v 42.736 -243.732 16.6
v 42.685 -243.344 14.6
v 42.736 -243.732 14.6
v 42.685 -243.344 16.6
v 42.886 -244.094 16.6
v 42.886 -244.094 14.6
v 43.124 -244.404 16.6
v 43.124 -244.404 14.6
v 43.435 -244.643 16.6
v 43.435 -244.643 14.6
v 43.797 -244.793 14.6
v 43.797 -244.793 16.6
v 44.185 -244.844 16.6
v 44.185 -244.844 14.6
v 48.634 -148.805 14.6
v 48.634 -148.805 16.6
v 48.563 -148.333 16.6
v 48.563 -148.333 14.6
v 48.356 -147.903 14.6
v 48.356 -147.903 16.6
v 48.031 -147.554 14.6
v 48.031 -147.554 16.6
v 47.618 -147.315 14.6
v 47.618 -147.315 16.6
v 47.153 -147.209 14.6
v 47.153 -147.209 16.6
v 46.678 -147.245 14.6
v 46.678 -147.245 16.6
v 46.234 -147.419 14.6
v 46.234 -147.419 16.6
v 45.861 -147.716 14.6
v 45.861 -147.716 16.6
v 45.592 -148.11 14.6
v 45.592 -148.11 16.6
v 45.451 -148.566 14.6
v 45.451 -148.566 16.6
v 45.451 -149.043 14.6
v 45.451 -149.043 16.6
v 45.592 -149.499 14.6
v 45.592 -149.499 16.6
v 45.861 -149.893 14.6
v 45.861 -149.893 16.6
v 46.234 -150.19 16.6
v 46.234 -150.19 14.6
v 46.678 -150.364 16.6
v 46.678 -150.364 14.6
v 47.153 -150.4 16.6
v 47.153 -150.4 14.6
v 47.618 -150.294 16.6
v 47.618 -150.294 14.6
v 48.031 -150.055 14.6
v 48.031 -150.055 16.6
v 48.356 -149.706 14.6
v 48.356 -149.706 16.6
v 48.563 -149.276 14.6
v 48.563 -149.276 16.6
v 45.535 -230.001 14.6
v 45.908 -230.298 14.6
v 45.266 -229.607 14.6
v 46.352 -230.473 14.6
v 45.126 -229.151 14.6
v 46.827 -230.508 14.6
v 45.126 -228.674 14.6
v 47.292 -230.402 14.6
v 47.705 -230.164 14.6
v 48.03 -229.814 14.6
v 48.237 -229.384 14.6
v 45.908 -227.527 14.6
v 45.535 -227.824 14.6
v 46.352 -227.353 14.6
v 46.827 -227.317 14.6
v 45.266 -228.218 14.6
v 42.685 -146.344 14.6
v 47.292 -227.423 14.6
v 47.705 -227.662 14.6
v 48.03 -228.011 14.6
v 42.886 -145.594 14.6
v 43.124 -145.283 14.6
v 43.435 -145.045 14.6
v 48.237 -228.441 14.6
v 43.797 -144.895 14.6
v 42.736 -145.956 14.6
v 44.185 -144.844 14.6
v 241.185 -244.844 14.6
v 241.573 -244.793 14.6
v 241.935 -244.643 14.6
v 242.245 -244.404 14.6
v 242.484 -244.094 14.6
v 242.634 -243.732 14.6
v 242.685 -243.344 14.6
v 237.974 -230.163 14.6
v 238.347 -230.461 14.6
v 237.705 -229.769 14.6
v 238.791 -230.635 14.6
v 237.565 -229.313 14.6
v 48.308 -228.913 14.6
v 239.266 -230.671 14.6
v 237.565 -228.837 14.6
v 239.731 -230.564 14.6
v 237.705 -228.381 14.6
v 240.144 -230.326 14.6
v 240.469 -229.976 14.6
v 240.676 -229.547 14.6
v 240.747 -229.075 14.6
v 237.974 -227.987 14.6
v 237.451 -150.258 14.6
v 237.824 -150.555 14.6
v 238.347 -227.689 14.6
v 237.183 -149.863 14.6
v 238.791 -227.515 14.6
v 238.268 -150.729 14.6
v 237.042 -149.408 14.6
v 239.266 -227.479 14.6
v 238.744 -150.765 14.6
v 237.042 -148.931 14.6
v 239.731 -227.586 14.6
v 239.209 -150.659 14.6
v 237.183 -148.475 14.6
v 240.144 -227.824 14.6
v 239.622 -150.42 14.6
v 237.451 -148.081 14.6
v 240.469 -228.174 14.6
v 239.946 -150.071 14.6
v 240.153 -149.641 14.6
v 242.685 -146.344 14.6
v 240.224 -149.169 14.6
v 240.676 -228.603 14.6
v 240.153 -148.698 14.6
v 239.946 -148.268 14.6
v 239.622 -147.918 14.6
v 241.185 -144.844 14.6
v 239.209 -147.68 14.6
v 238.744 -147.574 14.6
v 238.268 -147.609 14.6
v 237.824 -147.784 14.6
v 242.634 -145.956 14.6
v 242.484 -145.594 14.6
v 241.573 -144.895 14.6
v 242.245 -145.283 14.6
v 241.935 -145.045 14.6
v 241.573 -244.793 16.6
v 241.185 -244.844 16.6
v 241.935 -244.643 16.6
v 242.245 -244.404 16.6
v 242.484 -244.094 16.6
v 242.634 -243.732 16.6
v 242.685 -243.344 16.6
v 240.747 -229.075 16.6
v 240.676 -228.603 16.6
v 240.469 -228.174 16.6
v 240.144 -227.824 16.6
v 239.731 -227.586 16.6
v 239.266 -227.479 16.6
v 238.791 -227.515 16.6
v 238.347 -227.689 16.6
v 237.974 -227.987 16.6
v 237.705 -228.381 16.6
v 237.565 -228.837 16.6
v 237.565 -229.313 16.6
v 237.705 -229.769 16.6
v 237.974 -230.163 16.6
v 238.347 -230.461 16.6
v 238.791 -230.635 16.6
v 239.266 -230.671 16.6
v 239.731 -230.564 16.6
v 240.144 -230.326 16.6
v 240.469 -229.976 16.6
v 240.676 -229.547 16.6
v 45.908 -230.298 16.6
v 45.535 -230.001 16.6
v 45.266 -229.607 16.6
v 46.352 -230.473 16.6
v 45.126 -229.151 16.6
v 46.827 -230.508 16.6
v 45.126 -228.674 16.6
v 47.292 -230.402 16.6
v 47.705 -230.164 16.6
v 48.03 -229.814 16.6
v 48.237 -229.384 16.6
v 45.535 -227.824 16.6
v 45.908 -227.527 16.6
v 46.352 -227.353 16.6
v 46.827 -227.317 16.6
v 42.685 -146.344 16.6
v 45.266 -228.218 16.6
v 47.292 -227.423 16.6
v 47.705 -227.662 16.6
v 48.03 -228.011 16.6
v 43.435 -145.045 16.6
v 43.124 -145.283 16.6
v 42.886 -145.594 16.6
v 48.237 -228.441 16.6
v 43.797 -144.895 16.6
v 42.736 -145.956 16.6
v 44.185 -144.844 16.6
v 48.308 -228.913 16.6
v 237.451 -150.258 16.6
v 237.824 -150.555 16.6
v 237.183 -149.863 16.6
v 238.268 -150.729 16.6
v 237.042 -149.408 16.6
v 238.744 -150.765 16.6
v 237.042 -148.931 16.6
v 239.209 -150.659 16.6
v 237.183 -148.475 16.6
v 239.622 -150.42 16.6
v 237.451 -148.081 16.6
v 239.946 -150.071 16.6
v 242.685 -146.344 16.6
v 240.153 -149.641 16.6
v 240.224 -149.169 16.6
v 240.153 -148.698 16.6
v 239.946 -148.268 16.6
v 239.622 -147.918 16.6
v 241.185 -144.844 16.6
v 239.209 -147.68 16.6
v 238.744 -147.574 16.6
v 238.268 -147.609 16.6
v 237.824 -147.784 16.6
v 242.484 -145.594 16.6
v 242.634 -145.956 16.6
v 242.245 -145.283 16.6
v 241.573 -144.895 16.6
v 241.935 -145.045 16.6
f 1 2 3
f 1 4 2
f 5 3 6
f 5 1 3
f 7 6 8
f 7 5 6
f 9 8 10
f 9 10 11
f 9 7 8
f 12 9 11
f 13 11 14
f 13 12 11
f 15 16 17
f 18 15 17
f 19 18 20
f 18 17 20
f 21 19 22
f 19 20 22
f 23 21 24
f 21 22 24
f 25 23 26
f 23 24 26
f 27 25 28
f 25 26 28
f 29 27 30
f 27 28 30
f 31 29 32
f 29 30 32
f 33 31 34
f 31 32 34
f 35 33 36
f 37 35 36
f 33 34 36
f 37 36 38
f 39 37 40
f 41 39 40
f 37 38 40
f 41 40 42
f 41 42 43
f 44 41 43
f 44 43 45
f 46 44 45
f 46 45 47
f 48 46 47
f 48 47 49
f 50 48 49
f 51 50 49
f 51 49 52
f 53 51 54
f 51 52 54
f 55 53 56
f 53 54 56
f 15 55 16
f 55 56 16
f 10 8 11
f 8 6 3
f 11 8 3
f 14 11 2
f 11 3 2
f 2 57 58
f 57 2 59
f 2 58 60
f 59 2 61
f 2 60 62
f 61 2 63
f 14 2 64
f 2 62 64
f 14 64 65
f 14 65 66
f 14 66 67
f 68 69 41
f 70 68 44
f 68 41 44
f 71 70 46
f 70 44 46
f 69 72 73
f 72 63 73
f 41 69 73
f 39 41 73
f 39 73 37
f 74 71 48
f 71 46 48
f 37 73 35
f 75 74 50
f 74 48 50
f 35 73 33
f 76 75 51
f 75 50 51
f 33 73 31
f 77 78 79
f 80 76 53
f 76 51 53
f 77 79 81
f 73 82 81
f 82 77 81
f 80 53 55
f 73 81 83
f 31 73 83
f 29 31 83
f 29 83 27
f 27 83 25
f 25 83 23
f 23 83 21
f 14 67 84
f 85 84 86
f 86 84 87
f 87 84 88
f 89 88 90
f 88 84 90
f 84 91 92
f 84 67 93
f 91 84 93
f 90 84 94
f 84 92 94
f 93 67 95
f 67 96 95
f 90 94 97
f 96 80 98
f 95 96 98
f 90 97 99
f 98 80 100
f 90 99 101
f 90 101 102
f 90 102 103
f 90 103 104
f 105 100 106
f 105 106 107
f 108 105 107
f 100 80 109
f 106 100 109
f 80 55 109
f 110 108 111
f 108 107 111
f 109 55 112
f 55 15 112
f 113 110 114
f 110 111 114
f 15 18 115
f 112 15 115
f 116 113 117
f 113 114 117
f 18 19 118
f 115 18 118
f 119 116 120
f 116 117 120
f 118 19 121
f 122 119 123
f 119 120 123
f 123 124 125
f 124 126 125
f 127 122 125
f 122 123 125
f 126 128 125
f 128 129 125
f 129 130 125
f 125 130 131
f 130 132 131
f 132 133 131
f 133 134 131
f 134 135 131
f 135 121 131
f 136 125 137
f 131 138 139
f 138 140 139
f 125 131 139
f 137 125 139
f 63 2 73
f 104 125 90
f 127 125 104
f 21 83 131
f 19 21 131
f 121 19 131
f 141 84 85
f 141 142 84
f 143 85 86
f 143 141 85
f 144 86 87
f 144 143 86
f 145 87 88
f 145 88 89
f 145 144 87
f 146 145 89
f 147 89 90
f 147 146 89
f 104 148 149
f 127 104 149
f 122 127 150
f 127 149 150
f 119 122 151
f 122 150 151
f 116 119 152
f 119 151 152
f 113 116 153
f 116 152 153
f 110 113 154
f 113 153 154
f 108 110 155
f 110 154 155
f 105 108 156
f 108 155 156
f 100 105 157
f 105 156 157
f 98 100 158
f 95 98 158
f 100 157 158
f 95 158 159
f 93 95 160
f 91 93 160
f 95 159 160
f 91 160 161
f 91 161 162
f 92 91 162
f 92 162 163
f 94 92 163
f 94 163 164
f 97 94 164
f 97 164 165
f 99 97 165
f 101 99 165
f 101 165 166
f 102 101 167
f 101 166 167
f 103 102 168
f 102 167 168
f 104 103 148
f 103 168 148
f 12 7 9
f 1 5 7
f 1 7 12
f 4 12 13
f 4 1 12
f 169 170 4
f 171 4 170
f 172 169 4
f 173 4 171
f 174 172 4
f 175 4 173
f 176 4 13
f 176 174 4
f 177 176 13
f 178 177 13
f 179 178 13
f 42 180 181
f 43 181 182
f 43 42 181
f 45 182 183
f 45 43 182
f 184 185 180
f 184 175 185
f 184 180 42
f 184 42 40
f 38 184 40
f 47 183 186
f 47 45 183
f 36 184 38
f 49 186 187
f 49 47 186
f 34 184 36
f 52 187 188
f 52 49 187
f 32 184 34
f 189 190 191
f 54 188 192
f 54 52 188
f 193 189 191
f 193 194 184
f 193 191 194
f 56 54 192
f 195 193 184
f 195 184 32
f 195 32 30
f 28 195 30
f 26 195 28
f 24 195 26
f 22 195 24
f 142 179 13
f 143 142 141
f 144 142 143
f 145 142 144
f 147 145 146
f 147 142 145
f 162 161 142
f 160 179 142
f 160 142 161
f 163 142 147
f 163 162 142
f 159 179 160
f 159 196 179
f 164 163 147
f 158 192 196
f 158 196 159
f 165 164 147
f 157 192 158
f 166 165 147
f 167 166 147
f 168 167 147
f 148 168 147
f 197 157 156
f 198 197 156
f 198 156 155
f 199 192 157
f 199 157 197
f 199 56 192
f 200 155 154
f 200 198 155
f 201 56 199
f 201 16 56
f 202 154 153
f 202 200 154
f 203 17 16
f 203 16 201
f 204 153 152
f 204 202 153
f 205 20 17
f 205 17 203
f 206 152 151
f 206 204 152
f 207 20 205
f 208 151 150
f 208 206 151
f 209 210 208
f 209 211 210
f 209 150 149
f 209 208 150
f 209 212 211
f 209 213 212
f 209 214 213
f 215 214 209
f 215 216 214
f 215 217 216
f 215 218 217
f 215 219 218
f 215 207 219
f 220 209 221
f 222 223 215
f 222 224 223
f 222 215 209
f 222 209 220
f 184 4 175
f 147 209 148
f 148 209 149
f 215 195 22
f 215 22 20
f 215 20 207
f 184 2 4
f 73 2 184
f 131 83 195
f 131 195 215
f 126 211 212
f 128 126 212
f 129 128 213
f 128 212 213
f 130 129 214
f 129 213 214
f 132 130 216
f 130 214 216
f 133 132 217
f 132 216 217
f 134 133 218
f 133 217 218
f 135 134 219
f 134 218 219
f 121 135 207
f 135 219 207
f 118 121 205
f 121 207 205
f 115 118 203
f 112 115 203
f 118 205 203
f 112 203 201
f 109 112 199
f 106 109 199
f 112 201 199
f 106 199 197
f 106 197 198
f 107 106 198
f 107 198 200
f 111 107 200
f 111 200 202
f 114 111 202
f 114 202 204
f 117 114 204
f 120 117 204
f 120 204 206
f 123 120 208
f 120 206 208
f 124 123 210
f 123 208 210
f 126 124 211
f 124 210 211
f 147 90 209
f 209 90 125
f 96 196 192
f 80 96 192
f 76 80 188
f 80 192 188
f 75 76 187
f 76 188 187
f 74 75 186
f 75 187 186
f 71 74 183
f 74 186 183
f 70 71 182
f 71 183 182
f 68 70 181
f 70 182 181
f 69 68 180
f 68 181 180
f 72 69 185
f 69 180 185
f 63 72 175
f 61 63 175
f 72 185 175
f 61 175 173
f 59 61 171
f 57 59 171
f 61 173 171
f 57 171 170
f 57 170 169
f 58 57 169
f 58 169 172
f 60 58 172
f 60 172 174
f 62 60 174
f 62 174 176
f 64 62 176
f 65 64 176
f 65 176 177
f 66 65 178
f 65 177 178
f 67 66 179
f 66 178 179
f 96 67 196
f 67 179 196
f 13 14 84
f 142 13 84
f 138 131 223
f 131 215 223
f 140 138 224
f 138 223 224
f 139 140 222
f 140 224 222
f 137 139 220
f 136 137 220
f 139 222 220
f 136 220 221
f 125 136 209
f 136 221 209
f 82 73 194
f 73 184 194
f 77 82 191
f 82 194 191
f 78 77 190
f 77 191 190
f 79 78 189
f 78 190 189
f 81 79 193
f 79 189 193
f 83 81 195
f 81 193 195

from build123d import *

# Parameters (mm, degrees)
SKETCH_1_W          = 200
SKETCH_1_H          = 100.000000001
EXTRUDE_1_DEPTH     = 2
SKETCH_2_R          = 1.6
CUT_EXTRUDE_1_DEPTH = 2
FILLET_1_R          = 1.5


with BuildPart() as part:
    # 草图1 → 凸台-拉伸1 (new body)
    with BuildSketch(Plane.XY.offset(14.6000508)):
        with Locations((142.68478537, -194.843789688)):
            Rectangle(SKETCH_1_W, SKETCH_1_H)
    extrude(amount=EXTRUDE_1_DEPTH)

    # 草图2 → 切除-拉伸1 (cut)
    with BuildSketch(Plane.XY.offset(16.6000508)):
        with Locations((47.033603413, -148.804542119)):
            Circle(SKETCH_2_R)
        with Locations((238.624235091, -149.169262017)):
            Circle(SKETCH_2_R)
        with Locations((46.707705004, -228.912665547)):
            Circle(SKETCH_2_R)
        with Locations((239.14686479, -229.07501855)):
            Circle(SKETCH_2_R)
    extrude(amount=-CUT_EXTRUDE_1_DEPTH, mode=Mode.SUBTRACT)

    # 圆角1
    fillet_1_edges = [part.edges().sort_by_distance(p)[0] for p in [
        (42.68478537, -144.843789687, 15.6000508),
        (242.68478537, -144.843789687, 15.6000508),
        (242.68478537, -244.843789688, 15.6000508),
        (42.68478537, -244.843789688, 15.6000508),
    ]]
    fillet(fillet_1_edges, radius=FILLET_1_R)


solid = part.part
